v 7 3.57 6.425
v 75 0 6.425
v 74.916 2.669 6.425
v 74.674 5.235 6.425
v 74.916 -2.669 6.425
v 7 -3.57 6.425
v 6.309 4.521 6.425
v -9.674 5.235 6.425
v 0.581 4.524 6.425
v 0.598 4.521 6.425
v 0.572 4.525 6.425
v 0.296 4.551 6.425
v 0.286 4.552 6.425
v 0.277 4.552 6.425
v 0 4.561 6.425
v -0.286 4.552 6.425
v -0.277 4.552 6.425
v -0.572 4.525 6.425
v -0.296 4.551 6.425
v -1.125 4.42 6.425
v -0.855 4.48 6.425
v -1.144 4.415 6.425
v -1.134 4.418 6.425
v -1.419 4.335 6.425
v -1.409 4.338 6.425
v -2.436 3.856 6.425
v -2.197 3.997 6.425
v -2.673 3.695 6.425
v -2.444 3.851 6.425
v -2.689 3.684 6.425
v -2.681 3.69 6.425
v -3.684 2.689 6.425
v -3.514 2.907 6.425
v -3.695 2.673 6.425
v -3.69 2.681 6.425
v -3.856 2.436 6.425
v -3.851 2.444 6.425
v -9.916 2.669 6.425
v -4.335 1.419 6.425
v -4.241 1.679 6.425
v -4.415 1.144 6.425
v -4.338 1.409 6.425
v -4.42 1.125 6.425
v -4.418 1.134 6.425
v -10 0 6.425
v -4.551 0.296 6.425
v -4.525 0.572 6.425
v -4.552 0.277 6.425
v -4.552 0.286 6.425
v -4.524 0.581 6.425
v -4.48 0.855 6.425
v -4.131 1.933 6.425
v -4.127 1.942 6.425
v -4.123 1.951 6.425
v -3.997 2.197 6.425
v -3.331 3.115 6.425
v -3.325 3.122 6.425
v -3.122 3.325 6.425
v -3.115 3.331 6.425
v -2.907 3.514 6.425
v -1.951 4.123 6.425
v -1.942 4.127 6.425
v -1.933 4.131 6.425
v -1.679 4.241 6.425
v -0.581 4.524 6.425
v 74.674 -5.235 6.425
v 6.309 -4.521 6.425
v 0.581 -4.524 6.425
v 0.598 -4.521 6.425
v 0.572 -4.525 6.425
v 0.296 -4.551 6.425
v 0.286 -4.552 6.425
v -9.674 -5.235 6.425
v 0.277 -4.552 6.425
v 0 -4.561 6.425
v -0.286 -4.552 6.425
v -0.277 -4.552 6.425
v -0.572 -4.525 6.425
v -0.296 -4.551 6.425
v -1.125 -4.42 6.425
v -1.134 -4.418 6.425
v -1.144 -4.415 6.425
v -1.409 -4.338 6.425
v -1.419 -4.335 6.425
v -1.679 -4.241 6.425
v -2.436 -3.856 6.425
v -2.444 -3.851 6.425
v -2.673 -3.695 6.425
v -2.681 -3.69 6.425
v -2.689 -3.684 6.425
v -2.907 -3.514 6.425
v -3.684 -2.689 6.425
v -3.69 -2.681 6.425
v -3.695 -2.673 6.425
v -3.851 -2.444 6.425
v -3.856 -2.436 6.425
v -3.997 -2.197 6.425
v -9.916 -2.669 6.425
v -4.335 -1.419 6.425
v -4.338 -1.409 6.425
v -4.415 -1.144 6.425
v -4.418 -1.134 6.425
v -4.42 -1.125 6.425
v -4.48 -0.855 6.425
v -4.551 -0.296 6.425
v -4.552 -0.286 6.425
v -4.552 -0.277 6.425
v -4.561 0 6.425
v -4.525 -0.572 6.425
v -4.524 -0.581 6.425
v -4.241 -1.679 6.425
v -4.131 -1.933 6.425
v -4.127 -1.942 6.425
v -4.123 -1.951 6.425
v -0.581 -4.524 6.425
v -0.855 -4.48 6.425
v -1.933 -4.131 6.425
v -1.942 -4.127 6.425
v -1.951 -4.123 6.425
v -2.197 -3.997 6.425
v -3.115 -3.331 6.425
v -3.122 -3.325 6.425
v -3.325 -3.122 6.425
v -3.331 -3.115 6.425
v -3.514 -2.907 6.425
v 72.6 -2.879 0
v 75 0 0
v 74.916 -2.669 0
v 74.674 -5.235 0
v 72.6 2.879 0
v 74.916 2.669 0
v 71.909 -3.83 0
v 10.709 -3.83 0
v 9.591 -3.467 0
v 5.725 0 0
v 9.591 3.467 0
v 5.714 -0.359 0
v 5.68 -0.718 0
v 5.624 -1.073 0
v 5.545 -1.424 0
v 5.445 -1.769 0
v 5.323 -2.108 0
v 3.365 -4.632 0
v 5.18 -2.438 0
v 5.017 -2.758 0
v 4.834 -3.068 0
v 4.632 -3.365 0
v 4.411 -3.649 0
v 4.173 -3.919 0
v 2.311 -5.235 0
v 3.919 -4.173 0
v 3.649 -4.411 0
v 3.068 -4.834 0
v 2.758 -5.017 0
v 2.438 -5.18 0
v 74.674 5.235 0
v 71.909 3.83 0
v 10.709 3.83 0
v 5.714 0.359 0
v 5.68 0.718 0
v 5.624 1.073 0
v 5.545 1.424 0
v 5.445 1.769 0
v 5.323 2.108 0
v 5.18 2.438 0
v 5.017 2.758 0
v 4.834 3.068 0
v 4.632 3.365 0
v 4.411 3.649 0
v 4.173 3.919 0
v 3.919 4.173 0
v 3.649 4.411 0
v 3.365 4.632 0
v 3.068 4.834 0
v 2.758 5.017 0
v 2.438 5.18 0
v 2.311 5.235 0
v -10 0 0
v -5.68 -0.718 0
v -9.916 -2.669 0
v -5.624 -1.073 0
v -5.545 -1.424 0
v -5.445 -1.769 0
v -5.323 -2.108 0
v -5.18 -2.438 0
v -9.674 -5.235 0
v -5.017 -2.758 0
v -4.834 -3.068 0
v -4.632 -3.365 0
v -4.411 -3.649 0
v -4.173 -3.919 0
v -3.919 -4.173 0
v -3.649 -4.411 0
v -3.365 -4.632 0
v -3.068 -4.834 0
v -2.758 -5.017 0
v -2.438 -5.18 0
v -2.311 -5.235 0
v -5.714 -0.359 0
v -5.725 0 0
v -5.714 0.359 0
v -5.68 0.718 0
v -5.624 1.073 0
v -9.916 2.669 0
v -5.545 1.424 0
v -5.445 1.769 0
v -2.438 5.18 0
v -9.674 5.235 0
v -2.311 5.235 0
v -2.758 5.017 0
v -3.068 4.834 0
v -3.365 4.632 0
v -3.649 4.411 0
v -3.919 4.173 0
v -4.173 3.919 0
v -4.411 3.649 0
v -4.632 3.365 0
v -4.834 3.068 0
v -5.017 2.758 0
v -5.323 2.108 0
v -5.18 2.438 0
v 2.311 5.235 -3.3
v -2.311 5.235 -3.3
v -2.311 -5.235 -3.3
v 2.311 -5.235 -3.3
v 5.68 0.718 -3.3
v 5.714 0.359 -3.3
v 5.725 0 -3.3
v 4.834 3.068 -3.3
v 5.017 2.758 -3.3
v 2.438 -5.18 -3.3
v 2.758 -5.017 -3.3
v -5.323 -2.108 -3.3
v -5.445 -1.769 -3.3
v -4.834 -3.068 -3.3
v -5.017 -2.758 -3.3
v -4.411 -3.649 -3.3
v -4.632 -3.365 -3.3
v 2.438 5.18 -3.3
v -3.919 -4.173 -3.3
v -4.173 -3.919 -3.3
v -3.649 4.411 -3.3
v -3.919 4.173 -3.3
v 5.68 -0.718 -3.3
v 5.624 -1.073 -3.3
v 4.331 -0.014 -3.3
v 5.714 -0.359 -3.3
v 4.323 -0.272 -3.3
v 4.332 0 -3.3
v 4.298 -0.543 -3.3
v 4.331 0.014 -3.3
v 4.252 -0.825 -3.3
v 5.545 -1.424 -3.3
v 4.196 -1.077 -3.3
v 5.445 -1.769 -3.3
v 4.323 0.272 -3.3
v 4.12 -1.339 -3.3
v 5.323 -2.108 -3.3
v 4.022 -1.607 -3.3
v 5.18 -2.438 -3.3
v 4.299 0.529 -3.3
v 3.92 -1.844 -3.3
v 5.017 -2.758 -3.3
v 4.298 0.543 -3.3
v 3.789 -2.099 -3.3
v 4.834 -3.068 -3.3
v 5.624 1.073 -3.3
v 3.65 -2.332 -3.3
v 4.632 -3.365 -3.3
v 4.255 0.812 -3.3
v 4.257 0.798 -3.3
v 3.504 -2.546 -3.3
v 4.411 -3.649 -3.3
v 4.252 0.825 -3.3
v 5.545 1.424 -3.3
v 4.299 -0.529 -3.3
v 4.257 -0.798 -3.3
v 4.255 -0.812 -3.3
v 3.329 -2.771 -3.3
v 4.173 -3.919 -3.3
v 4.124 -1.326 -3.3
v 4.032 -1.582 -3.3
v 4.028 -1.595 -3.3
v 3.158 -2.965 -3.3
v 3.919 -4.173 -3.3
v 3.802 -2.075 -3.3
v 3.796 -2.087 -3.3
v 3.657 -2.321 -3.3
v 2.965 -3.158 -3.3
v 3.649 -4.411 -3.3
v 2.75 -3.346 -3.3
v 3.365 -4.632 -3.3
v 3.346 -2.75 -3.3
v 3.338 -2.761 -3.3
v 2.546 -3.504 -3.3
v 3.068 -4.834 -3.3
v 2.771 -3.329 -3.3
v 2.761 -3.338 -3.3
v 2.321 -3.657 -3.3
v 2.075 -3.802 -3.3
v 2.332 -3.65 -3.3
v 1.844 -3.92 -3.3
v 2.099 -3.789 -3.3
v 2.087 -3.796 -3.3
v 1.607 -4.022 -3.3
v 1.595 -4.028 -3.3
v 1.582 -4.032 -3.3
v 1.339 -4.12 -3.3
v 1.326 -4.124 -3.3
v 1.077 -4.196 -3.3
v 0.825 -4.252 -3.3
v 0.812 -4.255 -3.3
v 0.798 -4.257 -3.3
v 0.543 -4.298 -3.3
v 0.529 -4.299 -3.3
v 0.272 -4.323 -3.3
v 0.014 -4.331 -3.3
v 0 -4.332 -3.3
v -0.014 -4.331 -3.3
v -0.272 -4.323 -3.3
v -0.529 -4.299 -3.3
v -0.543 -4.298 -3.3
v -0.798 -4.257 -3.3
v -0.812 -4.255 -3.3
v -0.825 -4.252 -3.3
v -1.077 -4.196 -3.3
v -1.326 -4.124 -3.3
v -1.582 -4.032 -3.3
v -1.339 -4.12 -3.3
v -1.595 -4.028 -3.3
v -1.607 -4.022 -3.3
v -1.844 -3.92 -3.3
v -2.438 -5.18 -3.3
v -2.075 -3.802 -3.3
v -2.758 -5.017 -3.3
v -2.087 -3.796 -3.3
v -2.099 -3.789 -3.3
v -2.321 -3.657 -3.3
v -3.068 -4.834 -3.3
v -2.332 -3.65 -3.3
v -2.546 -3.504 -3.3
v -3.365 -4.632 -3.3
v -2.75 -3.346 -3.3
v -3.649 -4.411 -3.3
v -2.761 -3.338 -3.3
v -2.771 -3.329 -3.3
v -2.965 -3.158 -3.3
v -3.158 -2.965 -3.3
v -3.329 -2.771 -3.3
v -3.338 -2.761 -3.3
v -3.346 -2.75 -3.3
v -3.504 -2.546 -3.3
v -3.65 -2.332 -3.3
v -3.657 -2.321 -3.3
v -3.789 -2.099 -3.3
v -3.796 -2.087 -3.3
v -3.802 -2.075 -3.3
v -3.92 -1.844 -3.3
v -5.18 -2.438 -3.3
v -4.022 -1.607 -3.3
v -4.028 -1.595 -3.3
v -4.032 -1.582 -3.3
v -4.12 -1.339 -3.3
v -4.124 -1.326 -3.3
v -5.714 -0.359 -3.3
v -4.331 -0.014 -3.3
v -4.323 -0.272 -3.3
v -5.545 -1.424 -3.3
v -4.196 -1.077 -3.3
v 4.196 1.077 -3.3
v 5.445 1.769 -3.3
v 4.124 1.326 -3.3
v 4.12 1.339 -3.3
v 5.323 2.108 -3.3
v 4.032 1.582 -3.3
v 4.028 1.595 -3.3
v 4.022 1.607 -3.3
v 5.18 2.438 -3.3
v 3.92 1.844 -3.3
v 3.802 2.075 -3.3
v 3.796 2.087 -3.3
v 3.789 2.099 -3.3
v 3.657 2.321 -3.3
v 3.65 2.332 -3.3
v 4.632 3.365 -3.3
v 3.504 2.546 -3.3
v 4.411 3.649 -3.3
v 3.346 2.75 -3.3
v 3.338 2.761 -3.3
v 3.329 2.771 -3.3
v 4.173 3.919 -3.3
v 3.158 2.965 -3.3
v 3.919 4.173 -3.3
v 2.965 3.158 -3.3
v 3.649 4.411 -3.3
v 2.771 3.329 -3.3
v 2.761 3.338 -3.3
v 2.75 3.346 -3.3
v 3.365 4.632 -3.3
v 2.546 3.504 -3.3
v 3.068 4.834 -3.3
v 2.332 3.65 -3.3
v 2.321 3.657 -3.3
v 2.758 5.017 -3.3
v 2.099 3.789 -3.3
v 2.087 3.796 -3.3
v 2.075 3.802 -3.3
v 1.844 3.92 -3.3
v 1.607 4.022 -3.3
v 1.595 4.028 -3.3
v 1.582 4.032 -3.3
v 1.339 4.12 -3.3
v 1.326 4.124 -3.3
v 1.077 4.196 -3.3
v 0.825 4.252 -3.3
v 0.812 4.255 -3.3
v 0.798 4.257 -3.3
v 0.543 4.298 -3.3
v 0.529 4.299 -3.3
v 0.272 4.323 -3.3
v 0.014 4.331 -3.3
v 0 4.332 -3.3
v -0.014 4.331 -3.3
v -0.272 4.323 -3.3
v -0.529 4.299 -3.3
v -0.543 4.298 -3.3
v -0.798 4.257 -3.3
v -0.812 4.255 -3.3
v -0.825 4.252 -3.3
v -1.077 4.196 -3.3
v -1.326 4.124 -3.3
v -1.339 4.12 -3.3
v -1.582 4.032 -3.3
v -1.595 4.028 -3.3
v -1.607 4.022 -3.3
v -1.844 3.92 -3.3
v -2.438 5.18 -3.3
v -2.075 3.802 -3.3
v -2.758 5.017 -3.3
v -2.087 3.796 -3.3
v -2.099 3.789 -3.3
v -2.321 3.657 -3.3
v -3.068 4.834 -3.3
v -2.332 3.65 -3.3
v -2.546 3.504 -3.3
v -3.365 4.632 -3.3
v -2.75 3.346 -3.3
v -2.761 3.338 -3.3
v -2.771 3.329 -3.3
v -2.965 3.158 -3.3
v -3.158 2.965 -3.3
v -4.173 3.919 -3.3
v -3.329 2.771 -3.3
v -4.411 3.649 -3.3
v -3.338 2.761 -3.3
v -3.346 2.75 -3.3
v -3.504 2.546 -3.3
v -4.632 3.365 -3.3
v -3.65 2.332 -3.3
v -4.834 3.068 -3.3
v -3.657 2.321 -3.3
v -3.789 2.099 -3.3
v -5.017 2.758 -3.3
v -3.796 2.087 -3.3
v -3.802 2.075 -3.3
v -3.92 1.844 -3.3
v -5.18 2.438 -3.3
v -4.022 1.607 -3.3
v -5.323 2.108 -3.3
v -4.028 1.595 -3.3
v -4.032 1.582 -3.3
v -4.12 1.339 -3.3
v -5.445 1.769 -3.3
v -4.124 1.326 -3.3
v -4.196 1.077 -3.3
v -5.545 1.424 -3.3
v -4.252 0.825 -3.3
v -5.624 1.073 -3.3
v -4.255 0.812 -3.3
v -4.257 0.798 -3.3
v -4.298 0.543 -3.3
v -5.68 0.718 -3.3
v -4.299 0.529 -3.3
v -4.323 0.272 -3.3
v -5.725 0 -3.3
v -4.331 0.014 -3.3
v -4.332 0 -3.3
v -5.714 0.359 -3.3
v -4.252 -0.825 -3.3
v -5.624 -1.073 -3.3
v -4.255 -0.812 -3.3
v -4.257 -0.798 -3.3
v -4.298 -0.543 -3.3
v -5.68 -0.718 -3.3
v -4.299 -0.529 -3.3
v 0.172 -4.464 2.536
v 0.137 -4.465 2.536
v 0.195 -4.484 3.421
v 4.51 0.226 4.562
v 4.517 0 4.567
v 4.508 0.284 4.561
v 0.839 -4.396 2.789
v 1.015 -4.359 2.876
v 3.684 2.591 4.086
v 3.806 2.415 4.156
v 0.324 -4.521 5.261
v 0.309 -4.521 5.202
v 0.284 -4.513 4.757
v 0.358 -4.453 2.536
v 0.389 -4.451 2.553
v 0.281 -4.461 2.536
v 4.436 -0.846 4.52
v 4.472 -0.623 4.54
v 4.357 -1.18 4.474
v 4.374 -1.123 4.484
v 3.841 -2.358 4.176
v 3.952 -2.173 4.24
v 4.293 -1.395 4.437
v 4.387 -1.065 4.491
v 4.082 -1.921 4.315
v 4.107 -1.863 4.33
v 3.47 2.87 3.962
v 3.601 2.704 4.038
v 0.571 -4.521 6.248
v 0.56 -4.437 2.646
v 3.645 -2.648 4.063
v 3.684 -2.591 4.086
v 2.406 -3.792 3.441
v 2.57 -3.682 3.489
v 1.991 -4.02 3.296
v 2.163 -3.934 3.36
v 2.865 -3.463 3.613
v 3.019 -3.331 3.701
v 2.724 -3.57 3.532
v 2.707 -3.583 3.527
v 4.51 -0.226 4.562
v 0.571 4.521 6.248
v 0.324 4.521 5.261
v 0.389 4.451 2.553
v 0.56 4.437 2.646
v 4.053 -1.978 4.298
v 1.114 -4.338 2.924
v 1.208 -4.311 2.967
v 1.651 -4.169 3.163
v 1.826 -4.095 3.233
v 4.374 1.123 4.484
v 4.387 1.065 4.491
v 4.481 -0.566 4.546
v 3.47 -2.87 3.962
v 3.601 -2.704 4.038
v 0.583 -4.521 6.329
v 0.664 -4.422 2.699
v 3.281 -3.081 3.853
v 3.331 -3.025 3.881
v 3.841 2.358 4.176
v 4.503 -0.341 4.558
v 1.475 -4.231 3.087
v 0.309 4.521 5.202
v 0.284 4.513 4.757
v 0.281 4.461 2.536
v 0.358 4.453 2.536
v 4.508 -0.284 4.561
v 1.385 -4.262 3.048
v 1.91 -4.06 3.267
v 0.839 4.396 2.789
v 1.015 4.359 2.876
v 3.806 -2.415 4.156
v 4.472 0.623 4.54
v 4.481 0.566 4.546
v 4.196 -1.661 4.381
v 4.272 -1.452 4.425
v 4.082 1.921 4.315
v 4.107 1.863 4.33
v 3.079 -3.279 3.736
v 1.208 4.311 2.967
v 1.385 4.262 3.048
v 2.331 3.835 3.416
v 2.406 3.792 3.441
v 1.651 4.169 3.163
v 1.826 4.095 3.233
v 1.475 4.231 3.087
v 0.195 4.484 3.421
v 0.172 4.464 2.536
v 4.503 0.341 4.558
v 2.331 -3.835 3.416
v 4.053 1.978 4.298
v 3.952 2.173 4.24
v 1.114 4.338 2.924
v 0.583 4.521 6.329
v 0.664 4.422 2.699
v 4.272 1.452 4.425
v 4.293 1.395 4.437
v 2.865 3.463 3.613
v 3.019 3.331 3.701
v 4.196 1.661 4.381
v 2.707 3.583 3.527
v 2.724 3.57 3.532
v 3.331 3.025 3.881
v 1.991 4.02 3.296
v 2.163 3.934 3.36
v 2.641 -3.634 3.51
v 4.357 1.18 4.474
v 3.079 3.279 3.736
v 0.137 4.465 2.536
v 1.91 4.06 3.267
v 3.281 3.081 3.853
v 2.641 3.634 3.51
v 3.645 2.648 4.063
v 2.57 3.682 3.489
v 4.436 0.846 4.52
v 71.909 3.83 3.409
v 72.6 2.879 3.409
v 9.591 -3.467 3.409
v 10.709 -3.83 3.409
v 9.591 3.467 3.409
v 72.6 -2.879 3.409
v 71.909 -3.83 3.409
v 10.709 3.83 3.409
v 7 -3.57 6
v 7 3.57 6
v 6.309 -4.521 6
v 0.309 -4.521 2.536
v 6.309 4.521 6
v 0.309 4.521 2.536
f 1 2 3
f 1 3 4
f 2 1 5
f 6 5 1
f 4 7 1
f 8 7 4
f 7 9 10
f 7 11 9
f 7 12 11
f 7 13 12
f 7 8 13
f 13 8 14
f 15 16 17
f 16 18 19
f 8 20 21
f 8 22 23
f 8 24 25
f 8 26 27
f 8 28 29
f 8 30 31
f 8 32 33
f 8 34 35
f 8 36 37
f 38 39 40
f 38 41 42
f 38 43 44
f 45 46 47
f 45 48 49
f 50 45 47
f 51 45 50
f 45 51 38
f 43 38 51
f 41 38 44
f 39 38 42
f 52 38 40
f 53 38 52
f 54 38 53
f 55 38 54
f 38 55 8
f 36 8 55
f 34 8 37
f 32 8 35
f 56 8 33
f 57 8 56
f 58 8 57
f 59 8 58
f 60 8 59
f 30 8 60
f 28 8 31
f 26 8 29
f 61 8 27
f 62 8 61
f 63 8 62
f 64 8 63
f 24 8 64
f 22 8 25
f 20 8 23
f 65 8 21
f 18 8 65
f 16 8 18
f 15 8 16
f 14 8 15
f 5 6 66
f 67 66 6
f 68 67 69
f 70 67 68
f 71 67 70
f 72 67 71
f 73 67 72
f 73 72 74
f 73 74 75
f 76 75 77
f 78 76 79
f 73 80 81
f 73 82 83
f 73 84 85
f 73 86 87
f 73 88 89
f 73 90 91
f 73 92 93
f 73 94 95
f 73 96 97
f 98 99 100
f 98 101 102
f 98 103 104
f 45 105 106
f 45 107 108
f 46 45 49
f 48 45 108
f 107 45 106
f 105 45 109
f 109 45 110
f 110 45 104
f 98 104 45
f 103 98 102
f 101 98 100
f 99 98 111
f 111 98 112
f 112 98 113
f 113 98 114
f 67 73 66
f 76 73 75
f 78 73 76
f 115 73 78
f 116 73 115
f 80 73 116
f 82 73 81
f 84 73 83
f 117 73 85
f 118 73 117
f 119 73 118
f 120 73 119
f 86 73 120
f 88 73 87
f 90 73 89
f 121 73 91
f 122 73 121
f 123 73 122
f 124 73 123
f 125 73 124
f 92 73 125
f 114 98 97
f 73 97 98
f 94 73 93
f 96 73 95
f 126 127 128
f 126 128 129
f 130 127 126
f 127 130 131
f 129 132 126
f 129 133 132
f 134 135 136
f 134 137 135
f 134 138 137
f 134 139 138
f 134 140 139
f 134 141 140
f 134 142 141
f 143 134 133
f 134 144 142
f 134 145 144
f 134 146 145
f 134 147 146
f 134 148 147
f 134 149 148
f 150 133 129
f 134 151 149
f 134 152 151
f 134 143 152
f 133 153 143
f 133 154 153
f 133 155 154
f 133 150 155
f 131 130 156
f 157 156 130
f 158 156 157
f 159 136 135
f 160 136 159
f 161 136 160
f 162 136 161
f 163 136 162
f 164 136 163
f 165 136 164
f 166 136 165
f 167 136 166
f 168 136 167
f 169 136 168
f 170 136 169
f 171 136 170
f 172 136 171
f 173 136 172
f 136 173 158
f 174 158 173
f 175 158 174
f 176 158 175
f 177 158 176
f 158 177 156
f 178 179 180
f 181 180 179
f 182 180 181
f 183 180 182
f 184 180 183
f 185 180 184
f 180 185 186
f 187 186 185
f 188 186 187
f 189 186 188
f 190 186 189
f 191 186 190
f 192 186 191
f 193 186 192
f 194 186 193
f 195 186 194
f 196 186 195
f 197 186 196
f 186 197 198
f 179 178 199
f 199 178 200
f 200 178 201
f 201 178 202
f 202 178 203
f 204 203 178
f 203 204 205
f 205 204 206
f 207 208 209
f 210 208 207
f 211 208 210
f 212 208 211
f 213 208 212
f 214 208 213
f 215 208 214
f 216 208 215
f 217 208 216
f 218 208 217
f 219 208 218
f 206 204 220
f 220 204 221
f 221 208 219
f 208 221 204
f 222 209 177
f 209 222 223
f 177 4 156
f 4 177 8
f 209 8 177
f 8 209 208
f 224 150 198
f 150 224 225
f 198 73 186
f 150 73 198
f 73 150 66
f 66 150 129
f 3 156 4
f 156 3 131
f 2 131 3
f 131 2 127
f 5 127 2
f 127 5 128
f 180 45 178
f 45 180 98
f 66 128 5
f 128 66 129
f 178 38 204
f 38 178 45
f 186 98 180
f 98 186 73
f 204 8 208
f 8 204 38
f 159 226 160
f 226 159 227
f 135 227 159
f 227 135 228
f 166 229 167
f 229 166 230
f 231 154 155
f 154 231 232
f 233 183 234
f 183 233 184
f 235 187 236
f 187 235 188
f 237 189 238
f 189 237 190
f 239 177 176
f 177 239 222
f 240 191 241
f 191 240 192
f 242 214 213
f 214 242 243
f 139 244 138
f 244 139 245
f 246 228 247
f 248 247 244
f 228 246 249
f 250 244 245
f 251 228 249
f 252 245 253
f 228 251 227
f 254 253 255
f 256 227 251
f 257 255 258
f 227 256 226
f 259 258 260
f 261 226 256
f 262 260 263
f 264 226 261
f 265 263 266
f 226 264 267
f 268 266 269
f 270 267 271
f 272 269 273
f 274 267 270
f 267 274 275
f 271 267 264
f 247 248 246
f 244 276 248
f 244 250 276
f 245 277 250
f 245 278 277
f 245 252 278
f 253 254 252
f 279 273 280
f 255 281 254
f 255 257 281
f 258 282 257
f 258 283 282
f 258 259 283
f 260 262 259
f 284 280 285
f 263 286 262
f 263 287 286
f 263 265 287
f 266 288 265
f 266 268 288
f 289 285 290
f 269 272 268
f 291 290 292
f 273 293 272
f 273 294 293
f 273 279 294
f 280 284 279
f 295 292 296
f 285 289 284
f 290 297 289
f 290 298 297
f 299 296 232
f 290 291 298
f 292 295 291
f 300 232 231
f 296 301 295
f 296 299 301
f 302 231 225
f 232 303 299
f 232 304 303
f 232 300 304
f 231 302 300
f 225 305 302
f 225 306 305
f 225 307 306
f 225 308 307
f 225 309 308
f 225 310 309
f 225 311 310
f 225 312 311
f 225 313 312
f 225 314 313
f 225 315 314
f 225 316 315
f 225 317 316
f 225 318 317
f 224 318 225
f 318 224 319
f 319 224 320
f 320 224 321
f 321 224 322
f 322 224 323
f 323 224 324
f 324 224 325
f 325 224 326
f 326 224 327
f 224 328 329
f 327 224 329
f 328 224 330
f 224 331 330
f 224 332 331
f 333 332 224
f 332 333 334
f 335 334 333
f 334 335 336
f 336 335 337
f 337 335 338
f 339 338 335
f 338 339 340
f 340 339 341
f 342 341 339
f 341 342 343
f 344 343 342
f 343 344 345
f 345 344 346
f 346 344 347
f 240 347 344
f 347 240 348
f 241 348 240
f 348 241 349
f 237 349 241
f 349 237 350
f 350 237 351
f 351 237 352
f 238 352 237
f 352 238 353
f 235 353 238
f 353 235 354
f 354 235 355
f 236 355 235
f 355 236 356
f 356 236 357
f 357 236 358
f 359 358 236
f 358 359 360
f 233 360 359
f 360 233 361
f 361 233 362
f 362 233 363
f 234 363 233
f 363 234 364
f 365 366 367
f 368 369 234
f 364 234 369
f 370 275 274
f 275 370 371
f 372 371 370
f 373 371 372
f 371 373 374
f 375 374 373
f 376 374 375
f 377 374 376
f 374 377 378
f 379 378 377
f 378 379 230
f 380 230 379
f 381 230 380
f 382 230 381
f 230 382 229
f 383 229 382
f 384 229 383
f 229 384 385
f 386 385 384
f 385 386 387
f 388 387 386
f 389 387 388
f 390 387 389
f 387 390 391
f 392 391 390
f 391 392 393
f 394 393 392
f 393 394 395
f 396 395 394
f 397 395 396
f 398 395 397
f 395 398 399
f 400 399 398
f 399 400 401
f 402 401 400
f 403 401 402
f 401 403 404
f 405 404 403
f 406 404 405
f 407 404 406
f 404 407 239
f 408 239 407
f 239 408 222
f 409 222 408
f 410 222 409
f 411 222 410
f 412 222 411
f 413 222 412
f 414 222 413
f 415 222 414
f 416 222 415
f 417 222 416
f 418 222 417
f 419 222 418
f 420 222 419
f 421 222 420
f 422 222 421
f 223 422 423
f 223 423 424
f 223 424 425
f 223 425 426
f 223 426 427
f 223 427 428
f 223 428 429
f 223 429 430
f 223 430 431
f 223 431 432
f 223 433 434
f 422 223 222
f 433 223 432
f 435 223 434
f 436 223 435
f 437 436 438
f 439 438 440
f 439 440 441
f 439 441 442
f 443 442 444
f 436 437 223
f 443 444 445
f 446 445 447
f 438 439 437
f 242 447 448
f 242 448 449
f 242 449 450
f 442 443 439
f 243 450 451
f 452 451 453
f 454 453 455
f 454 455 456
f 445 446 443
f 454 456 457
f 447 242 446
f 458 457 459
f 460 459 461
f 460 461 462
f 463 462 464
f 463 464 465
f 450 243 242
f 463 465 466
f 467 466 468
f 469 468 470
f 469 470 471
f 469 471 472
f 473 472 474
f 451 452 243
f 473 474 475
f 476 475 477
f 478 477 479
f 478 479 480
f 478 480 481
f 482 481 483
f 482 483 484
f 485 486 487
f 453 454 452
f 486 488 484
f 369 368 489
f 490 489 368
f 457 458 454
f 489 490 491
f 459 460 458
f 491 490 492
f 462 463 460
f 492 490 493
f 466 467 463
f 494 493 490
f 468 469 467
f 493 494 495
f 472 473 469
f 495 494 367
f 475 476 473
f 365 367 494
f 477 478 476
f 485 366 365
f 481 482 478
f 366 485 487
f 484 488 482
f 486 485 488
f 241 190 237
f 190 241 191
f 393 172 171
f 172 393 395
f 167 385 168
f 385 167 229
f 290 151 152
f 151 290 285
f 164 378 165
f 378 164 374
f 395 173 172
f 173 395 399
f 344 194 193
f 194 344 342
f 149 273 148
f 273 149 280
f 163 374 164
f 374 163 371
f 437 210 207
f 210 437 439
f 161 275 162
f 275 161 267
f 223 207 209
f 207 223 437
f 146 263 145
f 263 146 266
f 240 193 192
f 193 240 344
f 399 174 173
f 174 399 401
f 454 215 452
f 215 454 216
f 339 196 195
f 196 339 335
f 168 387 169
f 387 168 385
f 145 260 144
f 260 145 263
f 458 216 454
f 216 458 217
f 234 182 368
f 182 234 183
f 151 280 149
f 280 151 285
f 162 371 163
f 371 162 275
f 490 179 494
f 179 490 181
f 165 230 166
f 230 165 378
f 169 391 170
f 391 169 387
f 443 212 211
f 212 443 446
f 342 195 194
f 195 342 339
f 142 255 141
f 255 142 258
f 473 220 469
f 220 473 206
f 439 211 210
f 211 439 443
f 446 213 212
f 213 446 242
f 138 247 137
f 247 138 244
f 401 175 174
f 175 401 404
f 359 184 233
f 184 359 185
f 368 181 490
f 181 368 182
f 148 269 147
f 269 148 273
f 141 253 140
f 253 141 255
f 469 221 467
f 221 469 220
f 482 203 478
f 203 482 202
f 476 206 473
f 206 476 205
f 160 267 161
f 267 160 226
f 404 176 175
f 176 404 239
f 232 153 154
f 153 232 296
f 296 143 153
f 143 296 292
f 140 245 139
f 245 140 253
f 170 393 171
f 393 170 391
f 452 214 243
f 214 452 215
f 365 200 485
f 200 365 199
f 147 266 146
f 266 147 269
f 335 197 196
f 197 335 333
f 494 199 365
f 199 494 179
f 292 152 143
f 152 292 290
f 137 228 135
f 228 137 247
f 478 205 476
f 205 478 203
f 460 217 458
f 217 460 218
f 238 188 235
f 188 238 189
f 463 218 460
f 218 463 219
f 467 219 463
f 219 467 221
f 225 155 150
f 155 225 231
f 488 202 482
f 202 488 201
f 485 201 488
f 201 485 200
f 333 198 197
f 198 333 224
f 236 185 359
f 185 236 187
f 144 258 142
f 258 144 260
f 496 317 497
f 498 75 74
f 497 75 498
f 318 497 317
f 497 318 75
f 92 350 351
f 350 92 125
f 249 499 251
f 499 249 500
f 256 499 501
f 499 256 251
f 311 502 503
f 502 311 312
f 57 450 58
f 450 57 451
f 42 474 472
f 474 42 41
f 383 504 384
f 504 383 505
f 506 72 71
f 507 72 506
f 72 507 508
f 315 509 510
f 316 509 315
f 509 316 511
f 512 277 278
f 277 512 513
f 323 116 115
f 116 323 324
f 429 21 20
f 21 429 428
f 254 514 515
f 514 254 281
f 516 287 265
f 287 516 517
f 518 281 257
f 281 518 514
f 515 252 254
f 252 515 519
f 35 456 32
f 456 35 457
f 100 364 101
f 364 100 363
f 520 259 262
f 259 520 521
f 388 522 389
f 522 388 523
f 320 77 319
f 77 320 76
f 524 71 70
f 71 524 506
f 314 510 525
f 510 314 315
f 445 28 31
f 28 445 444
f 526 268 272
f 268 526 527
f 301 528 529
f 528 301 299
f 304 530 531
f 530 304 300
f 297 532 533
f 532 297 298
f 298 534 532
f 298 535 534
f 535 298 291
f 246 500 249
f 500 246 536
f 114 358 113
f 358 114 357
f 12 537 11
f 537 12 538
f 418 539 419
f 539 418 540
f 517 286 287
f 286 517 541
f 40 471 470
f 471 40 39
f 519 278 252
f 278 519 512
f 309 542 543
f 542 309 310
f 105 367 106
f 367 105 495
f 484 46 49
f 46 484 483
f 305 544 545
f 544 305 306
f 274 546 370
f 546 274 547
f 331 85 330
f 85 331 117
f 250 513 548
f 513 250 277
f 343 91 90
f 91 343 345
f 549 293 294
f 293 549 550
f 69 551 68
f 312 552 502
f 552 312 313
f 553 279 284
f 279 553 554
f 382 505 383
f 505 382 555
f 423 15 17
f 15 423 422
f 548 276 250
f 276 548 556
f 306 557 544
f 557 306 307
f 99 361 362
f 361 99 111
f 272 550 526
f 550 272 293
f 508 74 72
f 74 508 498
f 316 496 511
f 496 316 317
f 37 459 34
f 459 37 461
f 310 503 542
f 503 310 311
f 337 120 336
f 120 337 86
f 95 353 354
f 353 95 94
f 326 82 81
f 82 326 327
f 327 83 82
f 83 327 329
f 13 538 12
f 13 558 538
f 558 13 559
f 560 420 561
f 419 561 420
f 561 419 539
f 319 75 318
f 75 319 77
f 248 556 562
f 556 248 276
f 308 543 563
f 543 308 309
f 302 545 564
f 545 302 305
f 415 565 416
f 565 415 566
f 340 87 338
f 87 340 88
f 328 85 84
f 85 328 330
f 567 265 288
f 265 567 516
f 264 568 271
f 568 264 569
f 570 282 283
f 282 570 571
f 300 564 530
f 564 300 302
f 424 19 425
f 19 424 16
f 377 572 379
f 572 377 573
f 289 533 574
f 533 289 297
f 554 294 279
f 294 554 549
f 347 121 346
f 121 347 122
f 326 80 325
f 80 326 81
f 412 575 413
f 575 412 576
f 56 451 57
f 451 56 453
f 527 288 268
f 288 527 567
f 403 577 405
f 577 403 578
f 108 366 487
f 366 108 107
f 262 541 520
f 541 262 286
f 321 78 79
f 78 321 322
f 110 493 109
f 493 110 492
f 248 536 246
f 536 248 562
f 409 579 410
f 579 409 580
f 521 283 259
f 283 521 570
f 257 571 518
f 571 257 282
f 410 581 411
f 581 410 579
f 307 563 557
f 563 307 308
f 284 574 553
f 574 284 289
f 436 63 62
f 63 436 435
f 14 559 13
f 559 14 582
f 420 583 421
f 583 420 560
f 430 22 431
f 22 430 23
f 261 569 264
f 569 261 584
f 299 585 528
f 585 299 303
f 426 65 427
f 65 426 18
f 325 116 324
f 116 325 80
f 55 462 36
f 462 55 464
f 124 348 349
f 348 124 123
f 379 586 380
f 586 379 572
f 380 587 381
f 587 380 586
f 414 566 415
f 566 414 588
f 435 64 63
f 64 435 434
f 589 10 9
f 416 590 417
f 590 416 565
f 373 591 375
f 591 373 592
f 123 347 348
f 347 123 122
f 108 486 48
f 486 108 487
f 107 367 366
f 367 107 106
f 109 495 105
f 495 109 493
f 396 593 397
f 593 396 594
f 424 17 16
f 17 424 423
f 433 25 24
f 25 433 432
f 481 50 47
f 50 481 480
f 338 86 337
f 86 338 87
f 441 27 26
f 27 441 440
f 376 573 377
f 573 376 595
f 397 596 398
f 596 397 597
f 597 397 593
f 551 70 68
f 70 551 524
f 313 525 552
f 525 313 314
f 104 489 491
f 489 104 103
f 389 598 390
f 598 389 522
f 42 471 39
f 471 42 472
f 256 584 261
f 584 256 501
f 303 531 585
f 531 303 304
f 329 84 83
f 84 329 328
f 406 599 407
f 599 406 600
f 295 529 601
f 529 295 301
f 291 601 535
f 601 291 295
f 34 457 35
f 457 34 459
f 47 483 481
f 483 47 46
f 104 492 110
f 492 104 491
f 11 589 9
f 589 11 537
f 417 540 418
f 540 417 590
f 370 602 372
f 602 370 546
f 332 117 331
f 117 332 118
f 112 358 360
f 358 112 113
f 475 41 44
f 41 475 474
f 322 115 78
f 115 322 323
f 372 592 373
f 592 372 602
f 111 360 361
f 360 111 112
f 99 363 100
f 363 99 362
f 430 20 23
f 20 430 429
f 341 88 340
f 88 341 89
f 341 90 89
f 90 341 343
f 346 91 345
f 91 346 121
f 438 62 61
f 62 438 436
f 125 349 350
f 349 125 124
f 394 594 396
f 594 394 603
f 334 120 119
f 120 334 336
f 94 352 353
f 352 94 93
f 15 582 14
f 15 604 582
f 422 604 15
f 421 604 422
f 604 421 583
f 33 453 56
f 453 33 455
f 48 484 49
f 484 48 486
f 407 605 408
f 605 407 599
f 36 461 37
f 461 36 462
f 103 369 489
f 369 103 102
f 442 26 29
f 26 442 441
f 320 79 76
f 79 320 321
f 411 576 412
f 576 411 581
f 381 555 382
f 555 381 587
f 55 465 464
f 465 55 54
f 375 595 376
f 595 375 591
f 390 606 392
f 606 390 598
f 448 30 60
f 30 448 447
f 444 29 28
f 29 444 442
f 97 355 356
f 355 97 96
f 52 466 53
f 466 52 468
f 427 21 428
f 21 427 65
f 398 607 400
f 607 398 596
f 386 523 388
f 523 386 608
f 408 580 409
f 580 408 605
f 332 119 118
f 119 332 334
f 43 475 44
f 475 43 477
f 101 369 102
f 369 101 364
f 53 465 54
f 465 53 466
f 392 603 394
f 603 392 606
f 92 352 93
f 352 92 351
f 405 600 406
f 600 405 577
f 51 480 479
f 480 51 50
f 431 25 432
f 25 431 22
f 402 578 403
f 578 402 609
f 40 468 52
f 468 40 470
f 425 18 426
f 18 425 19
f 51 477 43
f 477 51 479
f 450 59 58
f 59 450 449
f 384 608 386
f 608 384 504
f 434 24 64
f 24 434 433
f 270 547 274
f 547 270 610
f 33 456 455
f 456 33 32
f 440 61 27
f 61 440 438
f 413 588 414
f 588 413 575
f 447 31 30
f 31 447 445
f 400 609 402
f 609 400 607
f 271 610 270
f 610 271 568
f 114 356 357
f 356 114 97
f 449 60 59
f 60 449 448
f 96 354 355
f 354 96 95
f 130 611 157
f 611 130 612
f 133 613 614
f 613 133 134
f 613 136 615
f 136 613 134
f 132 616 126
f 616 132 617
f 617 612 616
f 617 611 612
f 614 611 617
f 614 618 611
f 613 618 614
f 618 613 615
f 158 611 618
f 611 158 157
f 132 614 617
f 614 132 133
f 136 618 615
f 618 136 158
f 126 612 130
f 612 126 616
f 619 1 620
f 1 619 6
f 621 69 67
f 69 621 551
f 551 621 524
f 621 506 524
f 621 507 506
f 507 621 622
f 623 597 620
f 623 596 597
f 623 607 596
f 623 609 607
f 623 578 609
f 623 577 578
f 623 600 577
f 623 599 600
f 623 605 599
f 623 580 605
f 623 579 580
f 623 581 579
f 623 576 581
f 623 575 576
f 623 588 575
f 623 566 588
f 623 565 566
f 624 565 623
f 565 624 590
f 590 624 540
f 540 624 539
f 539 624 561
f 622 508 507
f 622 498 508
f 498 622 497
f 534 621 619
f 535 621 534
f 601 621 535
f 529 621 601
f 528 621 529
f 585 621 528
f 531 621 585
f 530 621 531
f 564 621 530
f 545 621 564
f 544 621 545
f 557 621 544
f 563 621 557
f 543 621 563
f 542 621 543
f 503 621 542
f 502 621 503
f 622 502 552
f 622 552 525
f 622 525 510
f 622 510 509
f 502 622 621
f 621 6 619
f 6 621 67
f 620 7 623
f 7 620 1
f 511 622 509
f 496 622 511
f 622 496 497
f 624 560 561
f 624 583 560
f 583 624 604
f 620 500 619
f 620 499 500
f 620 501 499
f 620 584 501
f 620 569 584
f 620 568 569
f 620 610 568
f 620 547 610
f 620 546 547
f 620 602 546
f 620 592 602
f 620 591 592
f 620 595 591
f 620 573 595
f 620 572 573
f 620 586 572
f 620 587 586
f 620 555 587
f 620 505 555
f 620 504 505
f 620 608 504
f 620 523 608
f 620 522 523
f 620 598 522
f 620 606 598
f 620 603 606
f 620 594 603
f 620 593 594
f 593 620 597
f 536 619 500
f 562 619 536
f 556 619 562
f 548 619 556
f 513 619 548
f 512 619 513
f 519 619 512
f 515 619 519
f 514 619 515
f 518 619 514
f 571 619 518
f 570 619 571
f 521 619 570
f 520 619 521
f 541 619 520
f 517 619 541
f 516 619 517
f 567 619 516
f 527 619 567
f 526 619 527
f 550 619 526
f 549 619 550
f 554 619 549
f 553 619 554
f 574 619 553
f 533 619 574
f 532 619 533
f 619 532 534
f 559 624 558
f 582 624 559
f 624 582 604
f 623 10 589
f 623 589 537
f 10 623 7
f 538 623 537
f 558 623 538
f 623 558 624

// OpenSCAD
// This is a custom powder drop bar slider for the Lee Micro Disk
// -- which is no longer in production. It features customizable settings.
//
// Warning -- some sanding and fitting may be required.
//
// This is licensed under the creative commons+attribution license
// My design was inspired by SBfarmer and his design at
// http://www.thingiverse.com/thing:2174123
//
// To fulfil the attribution requirement, please link to:
// http://www.thingiverse.com/thing:2174932

/* [Main] */

// Add slope to powder drop hole?
shape=1; // [0:Without sloped hole,1:With sloped hole]

// Bar thickness in mm
bar_height=6.3;

// Z axis fudge factor in mm
zff=0.125;

// Bar width in mm
bar_width=10.47;

// Bar lenght in mm
bar_length=85;

// Bushing height in mm
bushing_height=9.6;

// Bushing outer diameter in mm
bushing_diameter=11.45;

// Diameter of powder drop hole top in mm
top_diameter=9.14;

// Diameter of powder drop hole bottom in mm
bottom_diameter=8.64;

// Number of sides on inner hole surface (higher number = smoother)
sides=100;

module body()
{
	difference()
	{
		union()
		{
			translate([-8,00,00])
			intersection()
			{
				translate([bar_length/2-2,0,(bar_height+zff)/2]) cube([bar_length,bar_width,bar_height+zff],center=true);
				translate([bar_length/2-2,0,(bar_height+zff)/2]) cylinder(h=bar_height+zff,r=bar_length/2,center=true,$fn=100);
			}
			intersection()
			{
				translate([00,00,1.5]) cylinder(h=bushing_height,r=bushing_diameter/2,center=true,$fn=100);
				translate([00,00,1.5]) cube([bushing_diameter,bar_width,bushing_height],center=true);
			}
		}
		// Drill powder drop hole
		translate([0,0,1.5]) cylinder(h=bushing_height+1,r1=bottom_diameter/2,r2=top_diameter/2,center=true,$fn=sides);
	}
}

difference()
{
	body();

	// Remove some material from handle
	minkowski()
	{
		translate([41,00,00]) cube([.72*bar_length,.55*bar_width,.75*(bar_height+zff)],center=true);
		cylinder(r=1);
	}
	if(shape==1)
	{
		// Add slope for powder drop hole
		minkowski()
		{
			translate([2,00,6]) rotate([90,00,00])	cylinder(h=top_diameter-2.0,r=4,center=true,$fn=3);
			cylinder(r=1);
		}
	}
}
